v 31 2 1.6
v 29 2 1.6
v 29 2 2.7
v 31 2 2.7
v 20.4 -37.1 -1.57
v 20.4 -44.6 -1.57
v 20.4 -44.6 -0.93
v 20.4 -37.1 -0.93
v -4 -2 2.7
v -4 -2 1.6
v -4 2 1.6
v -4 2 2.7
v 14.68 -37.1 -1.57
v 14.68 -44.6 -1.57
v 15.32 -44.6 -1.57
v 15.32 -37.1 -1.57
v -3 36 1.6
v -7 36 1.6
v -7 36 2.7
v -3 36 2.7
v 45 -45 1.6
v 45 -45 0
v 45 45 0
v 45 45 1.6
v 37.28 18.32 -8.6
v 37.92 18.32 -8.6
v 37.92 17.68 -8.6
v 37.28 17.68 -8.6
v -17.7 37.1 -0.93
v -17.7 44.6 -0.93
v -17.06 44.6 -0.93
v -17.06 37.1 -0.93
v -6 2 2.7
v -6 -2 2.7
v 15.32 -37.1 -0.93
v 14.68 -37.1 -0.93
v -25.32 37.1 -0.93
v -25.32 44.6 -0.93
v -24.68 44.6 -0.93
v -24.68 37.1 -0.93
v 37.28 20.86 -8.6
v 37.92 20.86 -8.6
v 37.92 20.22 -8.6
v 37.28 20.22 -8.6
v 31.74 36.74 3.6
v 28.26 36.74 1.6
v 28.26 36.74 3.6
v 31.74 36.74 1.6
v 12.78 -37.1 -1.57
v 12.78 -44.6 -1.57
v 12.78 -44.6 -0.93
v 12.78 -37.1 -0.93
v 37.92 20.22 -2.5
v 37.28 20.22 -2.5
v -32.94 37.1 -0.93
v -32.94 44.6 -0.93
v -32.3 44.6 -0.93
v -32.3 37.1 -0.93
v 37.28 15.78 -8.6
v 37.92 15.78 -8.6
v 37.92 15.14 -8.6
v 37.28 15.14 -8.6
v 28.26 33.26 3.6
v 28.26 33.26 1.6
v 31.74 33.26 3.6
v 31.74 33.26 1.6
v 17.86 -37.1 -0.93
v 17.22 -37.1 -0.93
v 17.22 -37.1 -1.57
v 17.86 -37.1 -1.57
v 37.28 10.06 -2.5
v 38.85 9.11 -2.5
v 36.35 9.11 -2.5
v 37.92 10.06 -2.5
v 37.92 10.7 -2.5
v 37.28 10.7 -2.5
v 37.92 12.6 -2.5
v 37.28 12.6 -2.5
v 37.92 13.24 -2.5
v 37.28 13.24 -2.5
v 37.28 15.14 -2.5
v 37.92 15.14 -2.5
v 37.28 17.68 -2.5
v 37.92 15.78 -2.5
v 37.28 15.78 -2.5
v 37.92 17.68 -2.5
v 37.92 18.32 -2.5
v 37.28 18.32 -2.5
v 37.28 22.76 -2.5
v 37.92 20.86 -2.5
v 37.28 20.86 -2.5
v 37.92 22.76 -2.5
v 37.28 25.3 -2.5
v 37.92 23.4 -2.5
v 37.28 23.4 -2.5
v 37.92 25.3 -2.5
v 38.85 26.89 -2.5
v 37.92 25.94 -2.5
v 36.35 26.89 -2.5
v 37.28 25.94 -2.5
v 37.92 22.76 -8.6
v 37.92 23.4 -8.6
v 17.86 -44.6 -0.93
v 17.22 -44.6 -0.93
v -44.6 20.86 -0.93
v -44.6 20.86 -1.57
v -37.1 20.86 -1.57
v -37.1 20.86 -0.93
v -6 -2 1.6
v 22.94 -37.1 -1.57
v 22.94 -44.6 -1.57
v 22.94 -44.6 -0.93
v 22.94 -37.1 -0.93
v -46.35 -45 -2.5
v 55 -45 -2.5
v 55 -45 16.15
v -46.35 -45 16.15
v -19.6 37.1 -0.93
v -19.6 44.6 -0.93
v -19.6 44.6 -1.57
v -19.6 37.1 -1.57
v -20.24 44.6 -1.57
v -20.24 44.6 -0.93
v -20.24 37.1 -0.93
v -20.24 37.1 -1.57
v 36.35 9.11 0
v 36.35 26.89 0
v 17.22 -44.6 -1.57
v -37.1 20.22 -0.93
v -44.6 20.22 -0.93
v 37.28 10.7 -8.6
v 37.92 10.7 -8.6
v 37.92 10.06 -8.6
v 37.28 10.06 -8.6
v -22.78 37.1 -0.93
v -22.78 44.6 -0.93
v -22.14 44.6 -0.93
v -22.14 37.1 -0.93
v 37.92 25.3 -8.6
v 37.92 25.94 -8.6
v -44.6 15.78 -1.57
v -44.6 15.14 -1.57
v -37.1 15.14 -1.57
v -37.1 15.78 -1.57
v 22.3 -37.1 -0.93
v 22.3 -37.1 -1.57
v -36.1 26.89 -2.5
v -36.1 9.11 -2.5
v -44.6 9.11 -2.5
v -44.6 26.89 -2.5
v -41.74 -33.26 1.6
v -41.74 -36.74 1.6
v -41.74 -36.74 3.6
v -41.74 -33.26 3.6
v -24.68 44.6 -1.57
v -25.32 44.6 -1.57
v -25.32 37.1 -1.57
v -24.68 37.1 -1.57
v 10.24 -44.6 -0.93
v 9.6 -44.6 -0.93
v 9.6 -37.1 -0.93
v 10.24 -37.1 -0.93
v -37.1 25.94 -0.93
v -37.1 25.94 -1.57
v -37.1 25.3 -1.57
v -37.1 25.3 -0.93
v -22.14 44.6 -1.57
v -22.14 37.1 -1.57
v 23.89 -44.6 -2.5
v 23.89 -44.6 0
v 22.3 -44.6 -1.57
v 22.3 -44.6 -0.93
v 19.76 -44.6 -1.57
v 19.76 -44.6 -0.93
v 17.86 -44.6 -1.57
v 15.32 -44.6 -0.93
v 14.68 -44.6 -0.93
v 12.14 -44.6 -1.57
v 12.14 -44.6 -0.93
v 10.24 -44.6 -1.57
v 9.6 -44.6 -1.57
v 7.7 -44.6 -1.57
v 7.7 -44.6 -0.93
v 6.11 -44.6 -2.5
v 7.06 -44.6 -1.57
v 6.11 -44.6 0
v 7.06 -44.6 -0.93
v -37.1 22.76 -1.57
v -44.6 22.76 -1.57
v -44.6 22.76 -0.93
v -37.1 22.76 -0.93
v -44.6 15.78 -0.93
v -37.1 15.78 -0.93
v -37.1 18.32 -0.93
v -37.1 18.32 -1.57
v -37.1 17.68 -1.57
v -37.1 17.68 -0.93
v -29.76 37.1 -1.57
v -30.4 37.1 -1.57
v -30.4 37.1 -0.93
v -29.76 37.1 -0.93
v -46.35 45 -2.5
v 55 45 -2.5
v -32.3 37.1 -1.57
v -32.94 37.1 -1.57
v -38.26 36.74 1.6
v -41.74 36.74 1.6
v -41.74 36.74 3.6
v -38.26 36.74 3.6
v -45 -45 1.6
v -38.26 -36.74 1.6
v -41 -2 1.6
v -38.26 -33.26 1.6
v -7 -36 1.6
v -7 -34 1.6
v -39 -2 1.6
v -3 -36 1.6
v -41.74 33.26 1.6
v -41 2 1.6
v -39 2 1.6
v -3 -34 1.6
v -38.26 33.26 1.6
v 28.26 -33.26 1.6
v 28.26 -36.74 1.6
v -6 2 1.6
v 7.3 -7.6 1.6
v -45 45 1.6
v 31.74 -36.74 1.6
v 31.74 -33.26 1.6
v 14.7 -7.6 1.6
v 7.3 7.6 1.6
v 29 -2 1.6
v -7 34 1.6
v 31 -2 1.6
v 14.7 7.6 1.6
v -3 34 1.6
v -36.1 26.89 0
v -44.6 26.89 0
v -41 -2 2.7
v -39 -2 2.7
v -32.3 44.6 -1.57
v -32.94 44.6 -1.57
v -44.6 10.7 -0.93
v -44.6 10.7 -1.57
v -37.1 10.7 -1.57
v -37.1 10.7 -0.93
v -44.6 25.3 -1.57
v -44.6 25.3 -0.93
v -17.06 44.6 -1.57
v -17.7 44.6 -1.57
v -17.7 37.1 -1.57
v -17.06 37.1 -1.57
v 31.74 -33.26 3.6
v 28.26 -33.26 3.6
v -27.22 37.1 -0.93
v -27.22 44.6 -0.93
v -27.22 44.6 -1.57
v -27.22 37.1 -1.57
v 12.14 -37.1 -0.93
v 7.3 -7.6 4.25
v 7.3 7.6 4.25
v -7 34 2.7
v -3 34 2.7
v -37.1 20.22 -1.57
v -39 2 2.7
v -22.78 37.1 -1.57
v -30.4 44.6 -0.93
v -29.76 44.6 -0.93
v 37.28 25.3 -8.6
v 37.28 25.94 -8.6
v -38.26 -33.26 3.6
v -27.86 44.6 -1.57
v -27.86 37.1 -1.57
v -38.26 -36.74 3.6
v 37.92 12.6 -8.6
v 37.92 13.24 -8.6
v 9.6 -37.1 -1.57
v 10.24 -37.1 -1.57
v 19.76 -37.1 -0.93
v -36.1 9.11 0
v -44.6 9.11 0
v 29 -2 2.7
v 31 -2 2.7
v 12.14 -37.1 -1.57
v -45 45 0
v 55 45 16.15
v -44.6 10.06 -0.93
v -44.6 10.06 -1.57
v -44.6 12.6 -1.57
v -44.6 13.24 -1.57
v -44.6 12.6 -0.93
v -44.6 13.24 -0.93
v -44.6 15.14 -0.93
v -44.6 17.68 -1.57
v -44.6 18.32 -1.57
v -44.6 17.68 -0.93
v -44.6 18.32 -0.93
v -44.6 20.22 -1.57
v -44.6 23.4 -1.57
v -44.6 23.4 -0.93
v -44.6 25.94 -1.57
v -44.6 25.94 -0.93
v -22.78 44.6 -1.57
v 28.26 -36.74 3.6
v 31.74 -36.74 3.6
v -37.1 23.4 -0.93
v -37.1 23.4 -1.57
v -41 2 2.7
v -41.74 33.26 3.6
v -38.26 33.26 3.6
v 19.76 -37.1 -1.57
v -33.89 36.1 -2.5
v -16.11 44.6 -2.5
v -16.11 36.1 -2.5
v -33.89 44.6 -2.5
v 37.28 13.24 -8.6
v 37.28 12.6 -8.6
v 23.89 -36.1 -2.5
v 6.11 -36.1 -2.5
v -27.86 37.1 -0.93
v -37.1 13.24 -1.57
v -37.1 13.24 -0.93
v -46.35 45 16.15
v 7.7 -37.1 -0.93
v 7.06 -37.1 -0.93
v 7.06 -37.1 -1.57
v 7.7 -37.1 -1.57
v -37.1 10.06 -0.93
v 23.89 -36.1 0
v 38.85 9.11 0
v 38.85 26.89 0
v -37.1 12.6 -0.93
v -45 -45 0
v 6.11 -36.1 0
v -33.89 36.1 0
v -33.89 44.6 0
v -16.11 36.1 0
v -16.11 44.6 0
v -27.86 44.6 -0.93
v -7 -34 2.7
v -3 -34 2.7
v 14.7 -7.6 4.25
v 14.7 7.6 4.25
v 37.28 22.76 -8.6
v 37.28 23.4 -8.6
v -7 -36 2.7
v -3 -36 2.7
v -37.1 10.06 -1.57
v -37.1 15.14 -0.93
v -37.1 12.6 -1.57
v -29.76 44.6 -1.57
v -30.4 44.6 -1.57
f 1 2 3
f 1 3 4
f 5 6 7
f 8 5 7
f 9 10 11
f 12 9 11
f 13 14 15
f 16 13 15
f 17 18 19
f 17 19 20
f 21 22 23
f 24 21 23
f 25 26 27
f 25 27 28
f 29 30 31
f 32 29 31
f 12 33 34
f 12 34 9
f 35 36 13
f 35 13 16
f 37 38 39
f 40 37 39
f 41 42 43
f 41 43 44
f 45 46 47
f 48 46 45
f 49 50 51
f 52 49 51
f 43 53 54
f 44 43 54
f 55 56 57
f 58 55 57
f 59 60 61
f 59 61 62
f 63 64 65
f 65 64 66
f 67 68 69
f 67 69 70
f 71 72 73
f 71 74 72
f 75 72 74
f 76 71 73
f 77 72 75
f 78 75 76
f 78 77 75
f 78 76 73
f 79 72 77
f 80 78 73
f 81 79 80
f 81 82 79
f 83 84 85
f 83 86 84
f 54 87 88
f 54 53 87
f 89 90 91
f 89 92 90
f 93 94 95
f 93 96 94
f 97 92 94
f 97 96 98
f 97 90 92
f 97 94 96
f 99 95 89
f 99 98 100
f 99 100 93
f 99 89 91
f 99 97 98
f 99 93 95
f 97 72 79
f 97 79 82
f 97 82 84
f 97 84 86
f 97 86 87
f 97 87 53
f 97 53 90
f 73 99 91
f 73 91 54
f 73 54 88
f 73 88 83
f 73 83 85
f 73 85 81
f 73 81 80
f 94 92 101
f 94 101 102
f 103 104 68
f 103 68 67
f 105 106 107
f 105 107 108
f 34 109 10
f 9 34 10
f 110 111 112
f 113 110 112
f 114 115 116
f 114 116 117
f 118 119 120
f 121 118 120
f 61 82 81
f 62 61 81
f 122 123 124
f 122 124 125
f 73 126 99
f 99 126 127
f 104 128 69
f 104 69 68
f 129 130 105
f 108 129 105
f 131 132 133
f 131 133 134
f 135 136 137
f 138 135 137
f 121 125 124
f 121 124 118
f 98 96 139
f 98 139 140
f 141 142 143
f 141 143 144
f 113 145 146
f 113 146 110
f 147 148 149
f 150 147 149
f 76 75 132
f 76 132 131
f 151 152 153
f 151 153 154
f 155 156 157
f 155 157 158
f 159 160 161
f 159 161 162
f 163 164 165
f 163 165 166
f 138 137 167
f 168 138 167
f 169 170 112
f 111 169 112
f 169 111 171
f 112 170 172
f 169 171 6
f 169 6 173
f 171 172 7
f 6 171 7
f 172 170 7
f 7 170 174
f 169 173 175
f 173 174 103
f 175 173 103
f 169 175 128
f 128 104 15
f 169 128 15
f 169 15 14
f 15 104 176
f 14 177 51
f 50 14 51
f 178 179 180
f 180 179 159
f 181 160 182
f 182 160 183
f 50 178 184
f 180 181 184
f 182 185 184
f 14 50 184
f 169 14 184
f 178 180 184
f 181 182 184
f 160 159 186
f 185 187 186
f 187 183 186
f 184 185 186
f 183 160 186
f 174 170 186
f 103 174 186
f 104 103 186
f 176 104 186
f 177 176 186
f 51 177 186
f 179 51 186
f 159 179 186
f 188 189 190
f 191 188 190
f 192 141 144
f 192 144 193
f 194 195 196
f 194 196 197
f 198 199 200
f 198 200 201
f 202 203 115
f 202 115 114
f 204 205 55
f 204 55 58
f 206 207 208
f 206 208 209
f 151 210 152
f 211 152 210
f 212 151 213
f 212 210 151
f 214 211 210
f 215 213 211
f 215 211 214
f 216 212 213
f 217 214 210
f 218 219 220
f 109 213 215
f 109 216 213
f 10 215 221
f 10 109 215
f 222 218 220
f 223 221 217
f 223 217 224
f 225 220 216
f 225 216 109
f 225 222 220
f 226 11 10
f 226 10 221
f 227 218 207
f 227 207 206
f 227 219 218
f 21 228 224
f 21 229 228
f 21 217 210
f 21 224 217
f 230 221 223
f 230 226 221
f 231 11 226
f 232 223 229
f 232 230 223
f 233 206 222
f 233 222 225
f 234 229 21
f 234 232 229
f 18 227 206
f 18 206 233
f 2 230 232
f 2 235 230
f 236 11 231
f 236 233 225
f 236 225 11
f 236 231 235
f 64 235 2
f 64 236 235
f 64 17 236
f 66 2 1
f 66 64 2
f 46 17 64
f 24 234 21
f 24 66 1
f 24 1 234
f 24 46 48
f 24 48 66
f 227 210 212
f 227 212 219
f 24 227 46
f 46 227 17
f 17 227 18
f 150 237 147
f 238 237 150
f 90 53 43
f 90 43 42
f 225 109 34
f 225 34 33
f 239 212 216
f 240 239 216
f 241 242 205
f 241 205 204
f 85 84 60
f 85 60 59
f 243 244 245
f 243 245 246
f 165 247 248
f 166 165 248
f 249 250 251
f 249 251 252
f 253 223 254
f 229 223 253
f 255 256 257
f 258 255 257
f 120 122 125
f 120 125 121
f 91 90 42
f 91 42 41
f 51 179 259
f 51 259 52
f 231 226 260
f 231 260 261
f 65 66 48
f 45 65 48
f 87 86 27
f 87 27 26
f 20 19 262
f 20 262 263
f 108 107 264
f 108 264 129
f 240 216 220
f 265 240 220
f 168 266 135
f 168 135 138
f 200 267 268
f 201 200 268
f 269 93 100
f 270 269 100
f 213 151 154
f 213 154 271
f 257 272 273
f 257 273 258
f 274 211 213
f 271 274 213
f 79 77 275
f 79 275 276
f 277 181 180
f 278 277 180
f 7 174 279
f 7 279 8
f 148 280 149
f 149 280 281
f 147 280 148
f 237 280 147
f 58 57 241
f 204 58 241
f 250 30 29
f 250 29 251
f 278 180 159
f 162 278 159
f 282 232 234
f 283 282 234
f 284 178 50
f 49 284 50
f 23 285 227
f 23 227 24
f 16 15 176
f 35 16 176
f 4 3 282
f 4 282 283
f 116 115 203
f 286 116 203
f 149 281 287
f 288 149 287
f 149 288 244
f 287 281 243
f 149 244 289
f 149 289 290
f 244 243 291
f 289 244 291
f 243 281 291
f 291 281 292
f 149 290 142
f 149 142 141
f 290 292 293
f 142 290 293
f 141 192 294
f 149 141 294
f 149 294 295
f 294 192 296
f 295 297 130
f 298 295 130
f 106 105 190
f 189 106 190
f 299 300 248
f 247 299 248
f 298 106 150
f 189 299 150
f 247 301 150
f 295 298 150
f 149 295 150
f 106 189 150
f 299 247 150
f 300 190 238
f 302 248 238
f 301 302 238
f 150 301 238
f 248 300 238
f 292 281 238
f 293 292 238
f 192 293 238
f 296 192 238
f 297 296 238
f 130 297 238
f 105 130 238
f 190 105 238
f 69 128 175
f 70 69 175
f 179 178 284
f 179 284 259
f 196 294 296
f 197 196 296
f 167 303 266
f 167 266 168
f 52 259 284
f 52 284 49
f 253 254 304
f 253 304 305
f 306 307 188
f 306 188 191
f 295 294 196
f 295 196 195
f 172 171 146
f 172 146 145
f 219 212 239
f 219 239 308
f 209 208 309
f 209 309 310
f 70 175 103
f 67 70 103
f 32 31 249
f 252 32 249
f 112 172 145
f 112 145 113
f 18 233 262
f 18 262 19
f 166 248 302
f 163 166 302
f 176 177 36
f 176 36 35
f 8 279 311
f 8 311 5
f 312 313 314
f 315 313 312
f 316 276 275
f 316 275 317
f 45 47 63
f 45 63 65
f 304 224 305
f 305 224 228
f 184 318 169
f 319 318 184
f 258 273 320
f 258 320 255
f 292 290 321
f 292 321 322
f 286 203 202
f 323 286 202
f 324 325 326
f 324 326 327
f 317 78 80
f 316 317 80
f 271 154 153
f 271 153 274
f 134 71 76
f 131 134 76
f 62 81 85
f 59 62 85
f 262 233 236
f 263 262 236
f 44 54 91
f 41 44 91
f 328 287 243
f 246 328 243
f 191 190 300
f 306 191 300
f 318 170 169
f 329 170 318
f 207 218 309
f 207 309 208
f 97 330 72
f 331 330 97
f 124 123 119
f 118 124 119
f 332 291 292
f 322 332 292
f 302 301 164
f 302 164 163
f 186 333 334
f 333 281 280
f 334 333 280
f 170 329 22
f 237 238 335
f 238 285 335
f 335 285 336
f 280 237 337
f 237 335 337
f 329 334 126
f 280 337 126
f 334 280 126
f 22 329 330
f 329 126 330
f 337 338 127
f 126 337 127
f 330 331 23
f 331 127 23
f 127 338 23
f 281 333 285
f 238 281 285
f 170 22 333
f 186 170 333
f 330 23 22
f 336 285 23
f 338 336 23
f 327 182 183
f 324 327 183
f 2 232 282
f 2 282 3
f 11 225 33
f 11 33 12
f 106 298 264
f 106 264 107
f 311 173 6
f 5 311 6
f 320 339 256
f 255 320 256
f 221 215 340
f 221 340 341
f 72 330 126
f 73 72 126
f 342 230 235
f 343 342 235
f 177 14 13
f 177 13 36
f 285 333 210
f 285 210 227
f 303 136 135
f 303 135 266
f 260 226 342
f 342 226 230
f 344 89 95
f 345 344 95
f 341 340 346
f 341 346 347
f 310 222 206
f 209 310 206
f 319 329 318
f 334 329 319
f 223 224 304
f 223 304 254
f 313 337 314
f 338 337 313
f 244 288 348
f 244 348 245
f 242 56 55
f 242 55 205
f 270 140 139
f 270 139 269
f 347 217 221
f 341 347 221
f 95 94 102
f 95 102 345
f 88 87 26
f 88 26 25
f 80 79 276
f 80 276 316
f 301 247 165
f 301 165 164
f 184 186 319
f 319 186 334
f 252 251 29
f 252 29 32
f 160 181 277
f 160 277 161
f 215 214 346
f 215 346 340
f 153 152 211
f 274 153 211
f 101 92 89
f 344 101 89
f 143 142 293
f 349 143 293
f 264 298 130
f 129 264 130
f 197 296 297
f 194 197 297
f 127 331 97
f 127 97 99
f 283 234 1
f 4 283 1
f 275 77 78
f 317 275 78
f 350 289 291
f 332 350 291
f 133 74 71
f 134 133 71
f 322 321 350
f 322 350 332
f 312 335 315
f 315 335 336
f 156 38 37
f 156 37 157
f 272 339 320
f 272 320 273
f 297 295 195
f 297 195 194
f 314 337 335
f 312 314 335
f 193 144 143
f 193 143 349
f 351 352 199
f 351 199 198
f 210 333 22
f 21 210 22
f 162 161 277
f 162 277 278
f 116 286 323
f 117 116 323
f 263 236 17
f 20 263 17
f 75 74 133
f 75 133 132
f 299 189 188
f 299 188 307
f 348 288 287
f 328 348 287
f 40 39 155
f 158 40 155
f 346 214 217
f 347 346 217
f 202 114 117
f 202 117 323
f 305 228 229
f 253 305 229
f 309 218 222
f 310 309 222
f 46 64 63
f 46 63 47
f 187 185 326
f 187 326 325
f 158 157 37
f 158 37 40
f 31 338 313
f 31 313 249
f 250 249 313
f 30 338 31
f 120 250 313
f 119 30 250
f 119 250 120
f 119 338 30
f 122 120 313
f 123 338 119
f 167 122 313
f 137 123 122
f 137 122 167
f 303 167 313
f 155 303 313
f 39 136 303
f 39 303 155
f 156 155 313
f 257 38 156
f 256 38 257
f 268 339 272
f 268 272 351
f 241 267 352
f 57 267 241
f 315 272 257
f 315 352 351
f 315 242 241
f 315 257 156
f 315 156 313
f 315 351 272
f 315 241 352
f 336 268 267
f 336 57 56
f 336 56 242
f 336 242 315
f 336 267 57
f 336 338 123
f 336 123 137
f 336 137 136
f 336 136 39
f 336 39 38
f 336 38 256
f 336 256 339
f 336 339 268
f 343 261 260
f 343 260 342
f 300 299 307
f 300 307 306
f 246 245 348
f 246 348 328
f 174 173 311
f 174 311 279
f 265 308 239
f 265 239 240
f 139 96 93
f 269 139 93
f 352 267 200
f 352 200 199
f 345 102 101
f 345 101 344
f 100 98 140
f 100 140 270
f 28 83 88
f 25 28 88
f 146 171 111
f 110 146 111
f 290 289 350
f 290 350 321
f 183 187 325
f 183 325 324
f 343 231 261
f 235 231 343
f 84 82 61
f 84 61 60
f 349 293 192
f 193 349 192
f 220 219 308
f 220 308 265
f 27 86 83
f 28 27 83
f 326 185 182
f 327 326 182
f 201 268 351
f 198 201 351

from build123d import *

# Parameters (mm, degrees)
SKETCH_1_W          = 90
SKETCH_1_H          = 90
EXTRUDE_1_DEPTH     = 1.6
SKETCH_4_W          = 17.78
SKETCH_4_H          = 8.5
SKETCH_4_W_2        = 2.5
SKETCH_4_H_2        = 17.78
SKETCH_4_W_3        = 8.5
EXTRUDE_2_DEPTH     = 2.5
SKETCH_5_W          = 0.64
SKETCH_5_H          = 0.64
EXTRUDE_3_DEPTH     = 6.1
SKETCH_6_W          = 3.48
SKETCH_6_H          = 3.48
EXTRUDE_4_DEPTH     = 2
SKETCH_7_W          = 2
SKETCH_7_H          = 4
SKETCH_7_W_2        = 4
SKETCH_7_H_2        = 2
EXTRUDE_5_DEPTH     = 1.1
SKETCH_8_W          = 7.4
SKETCH_8_H          = 15.2
EXTRUDE_6_DEPTH     = 2.65
SKETCH_9_W          = 0.64
SKETCH_9_H          = 0.64
CUT_EXTRUDE_1_DEPTH = 7.5
SKETCH_10_W         = 0.64
SKETCH_10_H         = 0.64
CUT_EXTRUDE_2_DEPTH = 7.5
SKETCH_11_W         = 0.64
SKETCH_11_H         = 0.64
CUT_EXTRUDE_3_DEPTH = 7.5
SKETCH_14_W         = 101.35
SKETCH_14_H         = 90
EXTRUDE_9_DEPTH     = 18.65


with BuildPart() as part:
    # ｽｹｯﾁ1 → ﾎﾞｽ - 押し出し1 (new body)
    with BuildSketch(Plane.XY):
        Rectangle(SKETCH_1_W, SKETCH_1_H)
    extrude(amount=EXTRUDE_1_DEPTH)

    # ｽｹｯﾁ4 → ﾎﾞｽ - 押し出し2 (add)
    with BuildSketch(Plane(origin=(0, 0, 0), x_dir=(-1, 0, 0), z_dir=(0, 0, -1))):
        with Locations((-15, -40.35)):
            Rectangle(SKETCH_4_W, SKETCH_4_H)
        with Locations((-37.6, 18)):
            Rectangle(SKETCH_4_W_2, SKETCH_4_H_2)
        with Locations((25, 40.35)):
            Rectangle(SKETCH_4_W, SKETCH_4_H)
        with Locations((40.35, 18)):
            Rectangle(SKETCH_4_W_3, SKETCH_4_H_2)
    extrude(amount=EXTRUDE_2_DEPTH)

    # ｽｹｯﾁ5 → ﾎﾞｽ - 押し出し3 (add)
    with BuildSketch(Plane(origin=(0, 0, -2.5), x_dir=(-1, 0, 0), z_dir=(0, 0, -1))):
        with Locations((-37.6, 18)):
            Rectangle(SKETCH_5_W, SKETCH_5_H)
        with Locations((-37.6, 15.46)):
            Rectangle(SKETCH_5_W, SKETCH_5_H)
        with Locations((-37.6, 12.92)):
            Rectangle(SKETCH_5_W, SKETCH_5_H)
        with Locations((-37.6, 10.38)):
            Rectangle(SKETCH_5_W, SKETCH_5_H)
        with Locations((-37.6, 20.54)):
            Rectangle(SKETCH_5_W, SKETCH_5_H)
        with Locations((-37.6, 23.08)):
            Rectangle(SKETCH_5_W, SKETCH_5_H)
        with Locations((-37.6, 25.62)):
            Rectangle(SKETCH_5_W, SKETCH_5_H)
    extrude(amount=EXTRUDE_3_DEPTH)

    # ｽｹｯﾁ6 → ﾎﾞｽ - 押し出し4 (add)
    with BuildSketch(Plane.XY.offset(1.6)):
        with Locations((-40, -35)):
            Rectangle(SKETCH_6_W, SKETCH_6_H)
        with Locations((-40, 35)):
            Rectangle(SKETCH_6_W, SKETCH_6_H)
        with Locations((30, -35)):
            Rectangle(SKETCH_6_W, SKETCH_6_H)
        with Locations((30, 35)):
            Rectangle(SKETCH_6_W, SKETCH_6_H)
    extrude(amount=EXTRUDE_4_DEPTH)

    # ｽｹｯﾁ7 → ﾎﾞｽ - 押し出し5 (add)
    with BuildSketch(Plane.XY.offset(1.6)):
        with Locations((-40, 0)):
            Rectangle(SKETCH_7_W, SKETCH_7_H)
        with Locations((30, 0)):
            Rectangle(SKETCH_7_W, SKETCH_7_H)
        with Locations((-5, 35)):
            Rectangle(SKETCH_7_W_2, SKETCH_7_H_2)
        with Locations((-5, -35)):
            Rectangle(SKETCH_7_W_2, SKETCH_7_H_2)
        with Locations((-5, 0)):
            Rectangle(SKETCH_7_W, SKETCH_7_H)
    extrude(amount=EXTRUDE_5_DEPTH)

    # ｽｹｯﾁ8 → ﾎﾞｽ - 押し出し6 (add)
    with BuildSketch(Plane.XY.offset(1.6)):
        with Locations((11, 0)):
            Rectangle(SKETCH_8_W, SKETCH_8_H)
    extrude(amount=EXTRUDE_6_DEPTH)

    # ｽｹｯﾁ9 → ｶｯﾄ - 押し出し1 (cut)
    with BuildSketch(Plane.XZ.offset(44.6)):
        with Locations((15, -1.25)):
            Rectangle(SKETCH_9_W, SKETCH_9_H)
        with Locations((12.46, -1.25)):
            Rectangle(SKETCH_9_W, SKETCH_9_H)
        with Locations((9.92, -1.25)):
            Rectangle(SKETCH_9_W, SKETCH_9_H)
        with Locations((7.38, -1.25)):
            Rectangle(SKETCH_9_W, SKETCH_9_H)
        with Locations((17.54, -1.25)):
            Rectangle(SKETCH_9_W, SKETCH_9_H)
        with Locations((20.08, -1.25)):
            Rectangle(SKETCH_9_W, SKETCH_9_H)
        with Locations((22.62, -1.25)):
            Rectangle(SKETCH_9_W, SKETCH_9_H)
    extrude(amount=-CUT_EXTRUDE_1_DEPTH, mode=Mode.SUBTRACT)

    # ｽｹｯﾁ10 → ｶｯﾄ - 押し出し2 (cut)
    with BuildSketch(Plane.ZY.offset(44.6)):
        with Locations((-1.25, 18)):
            Rectangle(SKETCH_10_W, SKETCH_10_H)
        with Locations((-1.25, 25.62)):
            Rectangle(SKETCH_10_W, SKETCH_10_H)
        with Locations((-1.25, 23.08)):
            Rectangle(SKETCH_10_W, SKETCH_10_H)
        with Locations((-1.25, 20.54)):
            Rectangle(SKETCH_10_W, SKETCH_10_H)
        with Locations((-1.25, 15.46)):
            Rectangle(SKETCH_10_W, SKETCH_10_H)
        with Locations((-1.25, 12.92)):
            Rectangle(SKETCH_10_W, SKETCH_10_H)
        with Locations((-1.25, 10.38)):
            Rectangle(SKETCH_10_W, SKETCH_10_H)
    extrude(amount=-CUT_EXTRUDE_2_DEPTH, mode=Mode.SUBTRACT)

    # ｽｹｯﾁ11 → ｶｯﾄ - 押し出し3 (cut)
    with BuildSketch(Plane(origin=(0, 44.6, 0), x_dir=(1, 0, 0), z_dir=(0, 1, 0))):
        with Locations((-25, 1.25)):
            Rectangle(SKETCH_11_W, SKETCH_11_H)
        with Locations((-32.62, 1.25)):
            Rectangle(SKETCH_11_W, SKETCH_11_H)
        with Locations((-30.08, 1.25)):
            Rectangle(SKETCH_11_W, SKETCH_11_H)
        with Locations((-27.54, 1.25)):
            Rectangle(SKETCH_11_W, SKETCH_11_H)
        with Locations((-22.46, 1.25)):
            Rectangle(SKETCH_11_W, SKETCH_11_H)
        with Locations((-19.92, 1.25)):
            Rectangle(SKETCH_11_W, SKETCH_11_H)
        with Locations((-17.38, 1.25)):
            Rectangle(SKETCH_11_W, SKETCH_11_H)
    extrude(amount=-CUT_EXTRUDE_3_DEPTH, mode=Mode.SUBTRACT)


with BuildPart() as body_2:
    # ｽｹｯﾁ14 → ﾎﾞｽ - 押し出し9 (new body)
    with BuildSketch(Plane(origin=(0, 0, -2.5), x_dir=(-1, 0, 0), z_dir=(0, 0, -1))):
        with Locations((-4.325, 0)):
            Rectangle(SKETCH_14_W, SKETCH_14_H)
    extrude(amount=-EXTRUDE_9_DEPTH)


solid = Compound([part.part, body_2.part])
